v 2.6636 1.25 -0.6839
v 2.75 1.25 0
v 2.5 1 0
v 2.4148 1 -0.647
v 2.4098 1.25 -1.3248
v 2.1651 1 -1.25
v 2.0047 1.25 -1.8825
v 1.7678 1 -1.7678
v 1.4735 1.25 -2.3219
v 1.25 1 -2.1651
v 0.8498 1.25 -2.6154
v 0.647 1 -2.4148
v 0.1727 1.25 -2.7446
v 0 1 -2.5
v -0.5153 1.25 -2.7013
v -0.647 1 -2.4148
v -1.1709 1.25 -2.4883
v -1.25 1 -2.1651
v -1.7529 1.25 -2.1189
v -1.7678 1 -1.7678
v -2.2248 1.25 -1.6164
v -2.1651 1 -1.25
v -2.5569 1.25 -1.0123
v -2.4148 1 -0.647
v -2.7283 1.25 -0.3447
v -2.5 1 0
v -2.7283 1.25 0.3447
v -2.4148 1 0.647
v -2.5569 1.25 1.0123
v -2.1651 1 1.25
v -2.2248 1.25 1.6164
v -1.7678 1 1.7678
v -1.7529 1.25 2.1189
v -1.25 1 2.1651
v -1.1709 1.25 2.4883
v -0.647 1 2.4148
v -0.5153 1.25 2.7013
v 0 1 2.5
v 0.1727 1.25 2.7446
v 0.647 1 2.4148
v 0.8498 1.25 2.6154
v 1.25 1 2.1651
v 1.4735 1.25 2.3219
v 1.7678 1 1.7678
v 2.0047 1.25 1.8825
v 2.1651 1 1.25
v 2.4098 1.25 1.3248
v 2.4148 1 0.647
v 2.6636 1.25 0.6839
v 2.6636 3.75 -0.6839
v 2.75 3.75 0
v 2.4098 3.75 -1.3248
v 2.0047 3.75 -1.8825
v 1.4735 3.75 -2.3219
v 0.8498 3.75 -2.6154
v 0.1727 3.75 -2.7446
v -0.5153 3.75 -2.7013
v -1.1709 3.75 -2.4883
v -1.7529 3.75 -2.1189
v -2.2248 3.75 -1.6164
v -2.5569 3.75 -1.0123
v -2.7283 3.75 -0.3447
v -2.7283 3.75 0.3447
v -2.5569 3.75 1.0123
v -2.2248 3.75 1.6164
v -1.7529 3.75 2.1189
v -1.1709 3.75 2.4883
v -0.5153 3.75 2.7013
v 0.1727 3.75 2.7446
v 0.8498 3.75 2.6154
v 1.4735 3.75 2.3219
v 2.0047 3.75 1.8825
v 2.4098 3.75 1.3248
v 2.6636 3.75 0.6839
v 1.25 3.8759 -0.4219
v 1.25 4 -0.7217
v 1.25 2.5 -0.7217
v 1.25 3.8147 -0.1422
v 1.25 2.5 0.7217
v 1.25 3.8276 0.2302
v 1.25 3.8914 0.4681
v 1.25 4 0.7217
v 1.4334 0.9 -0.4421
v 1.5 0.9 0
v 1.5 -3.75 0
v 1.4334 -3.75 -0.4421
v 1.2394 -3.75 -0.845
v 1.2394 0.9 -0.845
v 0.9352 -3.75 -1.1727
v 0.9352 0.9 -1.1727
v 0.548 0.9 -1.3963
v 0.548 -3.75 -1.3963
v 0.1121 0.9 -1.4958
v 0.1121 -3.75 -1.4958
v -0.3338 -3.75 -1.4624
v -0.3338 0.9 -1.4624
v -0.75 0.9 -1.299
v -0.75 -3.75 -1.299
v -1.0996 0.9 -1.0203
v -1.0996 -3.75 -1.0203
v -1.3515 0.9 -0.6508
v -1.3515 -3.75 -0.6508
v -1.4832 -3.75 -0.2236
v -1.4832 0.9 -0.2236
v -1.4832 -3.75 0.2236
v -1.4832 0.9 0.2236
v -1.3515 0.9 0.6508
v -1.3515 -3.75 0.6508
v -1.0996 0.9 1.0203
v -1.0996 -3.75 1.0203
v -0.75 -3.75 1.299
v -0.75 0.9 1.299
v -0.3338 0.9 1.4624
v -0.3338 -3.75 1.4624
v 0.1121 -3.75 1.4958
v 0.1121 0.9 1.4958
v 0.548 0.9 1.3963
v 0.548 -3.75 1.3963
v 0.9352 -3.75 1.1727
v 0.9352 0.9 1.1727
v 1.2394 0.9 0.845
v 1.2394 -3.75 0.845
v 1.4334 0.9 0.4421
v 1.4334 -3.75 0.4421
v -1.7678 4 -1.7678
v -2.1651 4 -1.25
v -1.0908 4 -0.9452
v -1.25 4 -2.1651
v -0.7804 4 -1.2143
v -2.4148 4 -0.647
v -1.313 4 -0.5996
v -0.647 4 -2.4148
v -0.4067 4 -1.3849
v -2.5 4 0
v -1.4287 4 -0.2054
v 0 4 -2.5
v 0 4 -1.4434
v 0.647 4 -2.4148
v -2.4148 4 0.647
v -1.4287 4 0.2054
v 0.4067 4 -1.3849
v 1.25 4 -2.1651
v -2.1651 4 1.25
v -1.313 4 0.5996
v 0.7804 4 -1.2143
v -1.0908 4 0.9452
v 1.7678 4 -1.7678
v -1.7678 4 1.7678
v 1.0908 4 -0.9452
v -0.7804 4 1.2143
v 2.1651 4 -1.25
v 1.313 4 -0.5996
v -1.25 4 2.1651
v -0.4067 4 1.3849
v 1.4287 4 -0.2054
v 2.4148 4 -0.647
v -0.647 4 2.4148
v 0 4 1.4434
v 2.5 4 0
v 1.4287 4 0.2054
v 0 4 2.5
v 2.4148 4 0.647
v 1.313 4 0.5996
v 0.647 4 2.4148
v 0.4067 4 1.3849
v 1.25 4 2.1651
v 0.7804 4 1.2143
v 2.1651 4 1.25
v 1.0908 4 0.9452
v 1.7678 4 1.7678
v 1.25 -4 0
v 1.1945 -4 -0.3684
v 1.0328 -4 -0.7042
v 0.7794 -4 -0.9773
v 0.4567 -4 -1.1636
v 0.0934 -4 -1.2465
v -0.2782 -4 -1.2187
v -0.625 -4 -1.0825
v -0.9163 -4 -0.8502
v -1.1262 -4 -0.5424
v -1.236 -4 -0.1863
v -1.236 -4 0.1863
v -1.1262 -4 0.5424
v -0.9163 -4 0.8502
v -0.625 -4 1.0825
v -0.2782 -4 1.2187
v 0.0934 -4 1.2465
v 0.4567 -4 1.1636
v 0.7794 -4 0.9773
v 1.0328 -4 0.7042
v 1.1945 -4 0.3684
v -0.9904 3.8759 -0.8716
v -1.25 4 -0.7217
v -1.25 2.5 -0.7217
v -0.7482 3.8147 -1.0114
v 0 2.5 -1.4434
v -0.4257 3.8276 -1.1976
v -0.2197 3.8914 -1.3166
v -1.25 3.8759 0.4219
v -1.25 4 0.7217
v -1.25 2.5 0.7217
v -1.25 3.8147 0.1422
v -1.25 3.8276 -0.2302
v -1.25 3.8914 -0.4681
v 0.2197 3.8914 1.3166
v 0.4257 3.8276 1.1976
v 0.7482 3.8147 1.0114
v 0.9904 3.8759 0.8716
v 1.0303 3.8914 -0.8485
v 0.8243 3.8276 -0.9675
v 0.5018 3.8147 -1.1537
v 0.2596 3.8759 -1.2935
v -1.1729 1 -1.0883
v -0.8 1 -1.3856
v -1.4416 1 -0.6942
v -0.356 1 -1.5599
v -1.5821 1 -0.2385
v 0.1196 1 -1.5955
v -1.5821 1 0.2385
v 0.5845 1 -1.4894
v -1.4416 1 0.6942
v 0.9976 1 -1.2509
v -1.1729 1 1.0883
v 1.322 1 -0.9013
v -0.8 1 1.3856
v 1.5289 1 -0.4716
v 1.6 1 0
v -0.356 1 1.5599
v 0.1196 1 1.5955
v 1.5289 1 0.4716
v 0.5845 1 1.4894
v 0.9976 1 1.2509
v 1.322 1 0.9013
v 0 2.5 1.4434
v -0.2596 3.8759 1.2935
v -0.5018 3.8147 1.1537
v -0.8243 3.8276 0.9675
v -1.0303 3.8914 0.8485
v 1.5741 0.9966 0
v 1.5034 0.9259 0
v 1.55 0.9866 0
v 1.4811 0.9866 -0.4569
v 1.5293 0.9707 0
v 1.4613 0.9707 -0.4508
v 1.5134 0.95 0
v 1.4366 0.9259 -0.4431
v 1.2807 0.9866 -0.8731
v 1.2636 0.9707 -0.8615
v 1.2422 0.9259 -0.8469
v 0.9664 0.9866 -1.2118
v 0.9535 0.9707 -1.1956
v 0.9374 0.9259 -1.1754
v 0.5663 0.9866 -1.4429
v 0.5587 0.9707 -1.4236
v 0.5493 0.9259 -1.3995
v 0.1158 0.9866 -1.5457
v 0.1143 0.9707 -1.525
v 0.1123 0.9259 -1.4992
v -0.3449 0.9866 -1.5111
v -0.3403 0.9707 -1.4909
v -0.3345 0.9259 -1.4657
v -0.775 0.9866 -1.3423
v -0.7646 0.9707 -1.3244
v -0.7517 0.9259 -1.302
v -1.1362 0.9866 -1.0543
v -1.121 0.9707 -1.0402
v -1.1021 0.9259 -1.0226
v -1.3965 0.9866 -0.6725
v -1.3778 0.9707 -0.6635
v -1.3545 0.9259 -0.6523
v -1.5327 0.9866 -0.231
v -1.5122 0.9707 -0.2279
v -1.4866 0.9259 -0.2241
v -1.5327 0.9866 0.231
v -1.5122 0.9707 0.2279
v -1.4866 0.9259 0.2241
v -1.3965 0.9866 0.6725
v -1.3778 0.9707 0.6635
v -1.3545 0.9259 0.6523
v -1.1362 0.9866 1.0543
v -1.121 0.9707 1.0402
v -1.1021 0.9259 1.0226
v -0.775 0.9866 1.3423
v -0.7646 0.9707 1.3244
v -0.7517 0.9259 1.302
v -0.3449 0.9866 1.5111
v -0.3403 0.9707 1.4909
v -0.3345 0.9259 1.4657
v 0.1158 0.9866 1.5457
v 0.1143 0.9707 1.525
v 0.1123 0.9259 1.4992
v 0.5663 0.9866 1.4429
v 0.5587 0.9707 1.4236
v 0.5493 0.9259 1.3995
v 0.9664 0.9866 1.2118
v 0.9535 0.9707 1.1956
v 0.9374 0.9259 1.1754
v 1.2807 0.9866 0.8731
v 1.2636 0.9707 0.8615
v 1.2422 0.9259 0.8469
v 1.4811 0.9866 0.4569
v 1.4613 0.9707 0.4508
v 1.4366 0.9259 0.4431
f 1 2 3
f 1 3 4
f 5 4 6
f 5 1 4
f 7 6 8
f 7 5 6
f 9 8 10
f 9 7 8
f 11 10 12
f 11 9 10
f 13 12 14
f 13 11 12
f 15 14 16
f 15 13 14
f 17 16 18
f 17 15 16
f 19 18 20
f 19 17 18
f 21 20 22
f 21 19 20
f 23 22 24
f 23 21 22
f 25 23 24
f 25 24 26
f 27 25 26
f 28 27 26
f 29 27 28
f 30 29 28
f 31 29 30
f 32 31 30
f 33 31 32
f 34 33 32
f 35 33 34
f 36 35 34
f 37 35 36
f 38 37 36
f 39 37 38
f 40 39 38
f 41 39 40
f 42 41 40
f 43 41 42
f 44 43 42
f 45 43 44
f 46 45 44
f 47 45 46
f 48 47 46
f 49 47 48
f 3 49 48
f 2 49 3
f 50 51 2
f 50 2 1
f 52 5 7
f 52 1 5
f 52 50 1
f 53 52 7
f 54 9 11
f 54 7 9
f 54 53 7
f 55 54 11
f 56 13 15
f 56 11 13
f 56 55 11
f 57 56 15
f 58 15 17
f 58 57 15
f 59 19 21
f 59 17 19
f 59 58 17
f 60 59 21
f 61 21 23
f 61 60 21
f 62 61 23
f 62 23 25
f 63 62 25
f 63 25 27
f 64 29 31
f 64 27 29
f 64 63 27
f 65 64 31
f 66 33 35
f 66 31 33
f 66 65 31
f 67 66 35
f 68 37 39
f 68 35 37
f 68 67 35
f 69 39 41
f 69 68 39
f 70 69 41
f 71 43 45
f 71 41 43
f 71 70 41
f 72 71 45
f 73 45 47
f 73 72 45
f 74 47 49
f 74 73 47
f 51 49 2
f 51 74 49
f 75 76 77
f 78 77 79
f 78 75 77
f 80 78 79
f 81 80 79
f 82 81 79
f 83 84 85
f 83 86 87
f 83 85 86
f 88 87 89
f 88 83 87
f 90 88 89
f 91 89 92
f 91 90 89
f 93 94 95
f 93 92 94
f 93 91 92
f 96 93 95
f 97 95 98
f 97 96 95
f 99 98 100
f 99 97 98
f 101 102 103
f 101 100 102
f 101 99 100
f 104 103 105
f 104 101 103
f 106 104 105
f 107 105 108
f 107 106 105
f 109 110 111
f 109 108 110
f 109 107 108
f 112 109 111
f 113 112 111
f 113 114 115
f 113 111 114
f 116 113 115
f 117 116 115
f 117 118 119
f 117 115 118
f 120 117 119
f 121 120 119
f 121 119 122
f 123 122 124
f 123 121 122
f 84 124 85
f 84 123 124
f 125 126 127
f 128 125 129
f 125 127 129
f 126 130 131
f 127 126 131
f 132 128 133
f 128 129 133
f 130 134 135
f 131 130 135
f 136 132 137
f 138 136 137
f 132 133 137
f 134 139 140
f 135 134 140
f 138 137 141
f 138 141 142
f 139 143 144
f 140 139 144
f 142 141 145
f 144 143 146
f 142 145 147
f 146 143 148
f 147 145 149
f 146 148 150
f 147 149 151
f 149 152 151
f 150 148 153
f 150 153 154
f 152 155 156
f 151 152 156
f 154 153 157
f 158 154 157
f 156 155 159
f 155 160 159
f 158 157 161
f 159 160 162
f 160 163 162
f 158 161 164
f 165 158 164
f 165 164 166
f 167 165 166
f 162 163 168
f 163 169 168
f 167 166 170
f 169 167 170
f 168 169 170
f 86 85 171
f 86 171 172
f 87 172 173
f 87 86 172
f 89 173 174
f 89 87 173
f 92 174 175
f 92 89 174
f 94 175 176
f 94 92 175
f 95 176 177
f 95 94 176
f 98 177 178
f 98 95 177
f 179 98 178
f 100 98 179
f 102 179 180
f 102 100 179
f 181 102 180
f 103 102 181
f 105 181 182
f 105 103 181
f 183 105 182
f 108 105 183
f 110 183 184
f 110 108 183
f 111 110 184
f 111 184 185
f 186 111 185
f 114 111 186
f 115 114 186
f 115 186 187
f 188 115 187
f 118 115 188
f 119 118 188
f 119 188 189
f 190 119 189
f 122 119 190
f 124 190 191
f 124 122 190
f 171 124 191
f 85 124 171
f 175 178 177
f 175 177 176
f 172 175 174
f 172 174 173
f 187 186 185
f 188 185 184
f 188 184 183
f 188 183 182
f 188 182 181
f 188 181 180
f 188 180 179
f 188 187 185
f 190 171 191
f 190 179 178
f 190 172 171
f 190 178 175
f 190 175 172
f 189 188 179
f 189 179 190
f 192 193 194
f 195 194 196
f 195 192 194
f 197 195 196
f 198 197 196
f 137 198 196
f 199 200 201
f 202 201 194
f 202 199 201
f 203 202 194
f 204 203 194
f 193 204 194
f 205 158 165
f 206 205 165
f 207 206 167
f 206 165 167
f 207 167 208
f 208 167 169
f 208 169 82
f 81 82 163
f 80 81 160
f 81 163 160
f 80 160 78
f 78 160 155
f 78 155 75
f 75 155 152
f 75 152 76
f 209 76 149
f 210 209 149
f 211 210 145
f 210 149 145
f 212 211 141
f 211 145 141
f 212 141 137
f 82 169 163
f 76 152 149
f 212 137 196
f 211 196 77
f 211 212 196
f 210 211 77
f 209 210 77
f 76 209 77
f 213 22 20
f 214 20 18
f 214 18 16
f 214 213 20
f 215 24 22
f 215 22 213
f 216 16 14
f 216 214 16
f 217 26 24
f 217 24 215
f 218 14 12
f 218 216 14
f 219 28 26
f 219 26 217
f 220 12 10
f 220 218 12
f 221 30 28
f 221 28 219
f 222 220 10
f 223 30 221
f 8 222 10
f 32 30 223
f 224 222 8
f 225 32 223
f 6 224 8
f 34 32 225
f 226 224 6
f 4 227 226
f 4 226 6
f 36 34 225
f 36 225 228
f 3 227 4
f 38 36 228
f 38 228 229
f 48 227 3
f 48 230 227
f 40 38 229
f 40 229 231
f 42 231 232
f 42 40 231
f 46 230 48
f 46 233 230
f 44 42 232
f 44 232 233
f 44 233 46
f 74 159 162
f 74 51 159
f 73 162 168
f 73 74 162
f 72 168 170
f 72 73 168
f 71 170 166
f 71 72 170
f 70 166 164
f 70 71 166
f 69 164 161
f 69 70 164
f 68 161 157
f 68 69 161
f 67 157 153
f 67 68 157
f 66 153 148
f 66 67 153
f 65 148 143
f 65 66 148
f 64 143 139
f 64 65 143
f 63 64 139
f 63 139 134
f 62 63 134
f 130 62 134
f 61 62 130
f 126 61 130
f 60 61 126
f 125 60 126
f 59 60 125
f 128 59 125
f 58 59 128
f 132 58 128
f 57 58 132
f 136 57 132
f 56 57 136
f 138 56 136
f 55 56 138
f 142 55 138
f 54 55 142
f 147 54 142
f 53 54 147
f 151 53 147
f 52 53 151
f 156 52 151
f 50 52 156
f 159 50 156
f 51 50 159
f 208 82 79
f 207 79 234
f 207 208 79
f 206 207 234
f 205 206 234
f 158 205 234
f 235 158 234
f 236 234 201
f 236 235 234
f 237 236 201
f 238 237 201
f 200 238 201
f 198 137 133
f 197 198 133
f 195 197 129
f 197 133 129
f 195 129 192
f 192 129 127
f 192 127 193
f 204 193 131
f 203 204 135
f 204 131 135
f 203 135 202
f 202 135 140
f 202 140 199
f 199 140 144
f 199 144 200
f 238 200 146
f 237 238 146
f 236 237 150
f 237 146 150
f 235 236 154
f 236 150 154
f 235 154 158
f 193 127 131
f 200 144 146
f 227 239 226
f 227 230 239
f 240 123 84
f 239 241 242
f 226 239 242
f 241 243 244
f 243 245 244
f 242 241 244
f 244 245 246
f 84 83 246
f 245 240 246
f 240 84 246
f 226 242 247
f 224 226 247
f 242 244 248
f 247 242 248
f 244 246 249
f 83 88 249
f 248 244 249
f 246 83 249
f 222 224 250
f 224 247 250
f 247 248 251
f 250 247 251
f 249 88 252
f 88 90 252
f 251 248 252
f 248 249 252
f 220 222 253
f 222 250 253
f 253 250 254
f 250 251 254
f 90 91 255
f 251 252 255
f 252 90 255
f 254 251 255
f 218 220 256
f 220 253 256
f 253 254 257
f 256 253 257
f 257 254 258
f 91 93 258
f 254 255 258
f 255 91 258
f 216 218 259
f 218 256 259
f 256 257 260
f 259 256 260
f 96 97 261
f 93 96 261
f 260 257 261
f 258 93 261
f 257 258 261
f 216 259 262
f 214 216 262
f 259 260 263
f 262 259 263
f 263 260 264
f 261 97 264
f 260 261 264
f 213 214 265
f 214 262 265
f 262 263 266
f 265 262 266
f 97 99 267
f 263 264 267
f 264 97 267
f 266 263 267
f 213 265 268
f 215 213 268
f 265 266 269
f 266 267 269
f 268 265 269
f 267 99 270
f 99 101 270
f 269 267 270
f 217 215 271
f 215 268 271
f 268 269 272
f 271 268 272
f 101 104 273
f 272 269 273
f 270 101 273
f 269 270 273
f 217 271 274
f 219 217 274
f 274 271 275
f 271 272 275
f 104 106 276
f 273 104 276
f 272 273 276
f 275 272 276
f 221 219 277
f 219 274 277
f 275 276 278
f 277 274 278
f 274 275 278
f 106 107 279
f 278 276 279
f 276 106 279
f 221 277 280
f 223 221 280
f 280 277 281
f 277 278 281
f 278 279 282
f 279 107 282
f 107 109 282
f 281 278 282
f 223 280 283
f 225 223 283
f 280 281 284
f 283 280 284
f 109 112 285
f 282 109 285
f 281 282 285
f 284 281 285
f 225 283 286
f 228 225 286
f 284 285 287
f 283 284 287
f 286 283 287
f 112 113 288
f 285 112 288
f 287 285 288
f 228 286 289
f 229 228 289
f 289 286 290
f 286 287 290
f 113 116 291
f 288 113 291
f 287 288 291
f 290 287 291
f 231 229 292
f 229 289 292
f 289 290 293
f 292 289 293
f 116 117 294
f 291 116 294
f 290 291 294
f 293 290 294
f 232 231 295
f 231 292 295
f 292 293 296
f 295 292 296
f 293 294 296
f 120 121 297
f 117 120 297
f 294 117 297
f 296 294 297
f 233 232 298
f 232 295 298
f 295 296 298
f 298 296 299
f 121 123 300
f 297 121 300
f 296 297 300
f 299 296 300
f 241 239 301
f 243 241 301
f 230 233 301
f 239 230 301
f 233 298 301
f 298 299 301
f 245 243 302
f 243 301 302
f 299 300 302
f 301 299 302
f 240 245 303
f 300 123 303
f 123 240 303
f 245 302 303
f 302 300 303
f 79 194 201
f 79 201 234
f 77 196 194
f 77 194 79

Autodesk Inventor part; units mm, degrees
ref_plane "YZ Plane" through (0, 0, 0) normal (1, 0, 0) x (0, 1, 0)
ref_plane "XZ Plane" through (0, 0, 0) normal (0, 1, 0) x (-1, 0, 0)
ref_plane "XY Plane" through (0, 0, 0) normal (0, 0, 1) x (1, 0, 0)
sketch "Sketch1" plane through (0, 0, 0) normal (0, 0, 1) x (1, 0, 0)
  line L0 (0, 4) -> (0, -4)
  line L1 (0, -4) -> (1.25, -4)
  line L2 (1.25, -4) -> (1.5, -3.75)
  line L3 (1.5, -3.75) -> (1.5, 0.9)
  line L4 (1.6, 1) -> (2.5, 1)
  line L5 (2.75, 1.25) -> (2.75, 3.75)
  line L6 (2.5, 4) -> (0, 4)
  arc A0 (1.6, 1) -> (1.5, 0.9) centre (1.6, 0.9) ccw
  line L7 (2.5, 4) -> (2.75, 3.75)
  line L8 (2.5, 1) -> (2.75, 1.25)
  point P0 (0, 0)
  point P1 (2.75, 1)
  point P2 (2.75, 4)
  point P3 (0, 0)
  dimension "d0" = 5.5
  dimension "d1" = 3
  dimension "d3" = 3
  dimension "d4" = 3.2
  dimension "d5" = 135
  dimension "d6" = 0.25
  dimension "d7" = 5
  dimension "d18" = 0.25
revolve "Revolution1" add sketch "Sketch1" angle 360 about axis through (0, 4, 0) along (0, -1, 0)
sketch "Sketch2" plane through (0, 4, 0) normal (0, 1, 0) x (1, 0, 0)
  line L0 (0, -1.4434) -> (-1.25, -0.7217)
  line L1 (-1.25, -0.7217) -> (-1.25, 0.7217)
  line L2 (-1.25, 0.7217) -> (0, 1.4434)
  line L3 (0, 1.4434) -> (1.25, 0.7217)
  line L4 (1.25, 0.7217) -> (1.25, -0.7217)
  line L5 (1.25, -0.7217) -> (0, -1.4434)
  point P0 (0, 0)
  point P1 (0, 0)
  dimension "d11" = 2.5
extrude "Extrusion1" cut sketch "Sketch2" against normal blind 1.5
thread "Thread1" size "M3x0.5" class "6g" standard "ANSI Metric M Profile" full length
sketch "Sketch3" plane through (0, 0, 0) normal (1, 0, 0) x (0, 1, 0)
  line L0 (4, 1.4434) -> (4, 0.7217) projected
  line L1 (4, 1.4434) -> (3.5, 0.9434)
  line L2 (3.5, 0.9434) -> (4, 0.9434)
  line L3 (4, 0.9434) -> (4, 1.4434)
  line L4 (-0.9, 0) -> (5.4, 0) projected
  point P0 (0, 0)
  dimension "d16" = 0.5
revolve "Revolution2" cut sketch "Sketch3" angle 360 about axis through (0, -10, 0) along (0, 1, 0)
properties part number "48-0350" material "Stainless Steel"
